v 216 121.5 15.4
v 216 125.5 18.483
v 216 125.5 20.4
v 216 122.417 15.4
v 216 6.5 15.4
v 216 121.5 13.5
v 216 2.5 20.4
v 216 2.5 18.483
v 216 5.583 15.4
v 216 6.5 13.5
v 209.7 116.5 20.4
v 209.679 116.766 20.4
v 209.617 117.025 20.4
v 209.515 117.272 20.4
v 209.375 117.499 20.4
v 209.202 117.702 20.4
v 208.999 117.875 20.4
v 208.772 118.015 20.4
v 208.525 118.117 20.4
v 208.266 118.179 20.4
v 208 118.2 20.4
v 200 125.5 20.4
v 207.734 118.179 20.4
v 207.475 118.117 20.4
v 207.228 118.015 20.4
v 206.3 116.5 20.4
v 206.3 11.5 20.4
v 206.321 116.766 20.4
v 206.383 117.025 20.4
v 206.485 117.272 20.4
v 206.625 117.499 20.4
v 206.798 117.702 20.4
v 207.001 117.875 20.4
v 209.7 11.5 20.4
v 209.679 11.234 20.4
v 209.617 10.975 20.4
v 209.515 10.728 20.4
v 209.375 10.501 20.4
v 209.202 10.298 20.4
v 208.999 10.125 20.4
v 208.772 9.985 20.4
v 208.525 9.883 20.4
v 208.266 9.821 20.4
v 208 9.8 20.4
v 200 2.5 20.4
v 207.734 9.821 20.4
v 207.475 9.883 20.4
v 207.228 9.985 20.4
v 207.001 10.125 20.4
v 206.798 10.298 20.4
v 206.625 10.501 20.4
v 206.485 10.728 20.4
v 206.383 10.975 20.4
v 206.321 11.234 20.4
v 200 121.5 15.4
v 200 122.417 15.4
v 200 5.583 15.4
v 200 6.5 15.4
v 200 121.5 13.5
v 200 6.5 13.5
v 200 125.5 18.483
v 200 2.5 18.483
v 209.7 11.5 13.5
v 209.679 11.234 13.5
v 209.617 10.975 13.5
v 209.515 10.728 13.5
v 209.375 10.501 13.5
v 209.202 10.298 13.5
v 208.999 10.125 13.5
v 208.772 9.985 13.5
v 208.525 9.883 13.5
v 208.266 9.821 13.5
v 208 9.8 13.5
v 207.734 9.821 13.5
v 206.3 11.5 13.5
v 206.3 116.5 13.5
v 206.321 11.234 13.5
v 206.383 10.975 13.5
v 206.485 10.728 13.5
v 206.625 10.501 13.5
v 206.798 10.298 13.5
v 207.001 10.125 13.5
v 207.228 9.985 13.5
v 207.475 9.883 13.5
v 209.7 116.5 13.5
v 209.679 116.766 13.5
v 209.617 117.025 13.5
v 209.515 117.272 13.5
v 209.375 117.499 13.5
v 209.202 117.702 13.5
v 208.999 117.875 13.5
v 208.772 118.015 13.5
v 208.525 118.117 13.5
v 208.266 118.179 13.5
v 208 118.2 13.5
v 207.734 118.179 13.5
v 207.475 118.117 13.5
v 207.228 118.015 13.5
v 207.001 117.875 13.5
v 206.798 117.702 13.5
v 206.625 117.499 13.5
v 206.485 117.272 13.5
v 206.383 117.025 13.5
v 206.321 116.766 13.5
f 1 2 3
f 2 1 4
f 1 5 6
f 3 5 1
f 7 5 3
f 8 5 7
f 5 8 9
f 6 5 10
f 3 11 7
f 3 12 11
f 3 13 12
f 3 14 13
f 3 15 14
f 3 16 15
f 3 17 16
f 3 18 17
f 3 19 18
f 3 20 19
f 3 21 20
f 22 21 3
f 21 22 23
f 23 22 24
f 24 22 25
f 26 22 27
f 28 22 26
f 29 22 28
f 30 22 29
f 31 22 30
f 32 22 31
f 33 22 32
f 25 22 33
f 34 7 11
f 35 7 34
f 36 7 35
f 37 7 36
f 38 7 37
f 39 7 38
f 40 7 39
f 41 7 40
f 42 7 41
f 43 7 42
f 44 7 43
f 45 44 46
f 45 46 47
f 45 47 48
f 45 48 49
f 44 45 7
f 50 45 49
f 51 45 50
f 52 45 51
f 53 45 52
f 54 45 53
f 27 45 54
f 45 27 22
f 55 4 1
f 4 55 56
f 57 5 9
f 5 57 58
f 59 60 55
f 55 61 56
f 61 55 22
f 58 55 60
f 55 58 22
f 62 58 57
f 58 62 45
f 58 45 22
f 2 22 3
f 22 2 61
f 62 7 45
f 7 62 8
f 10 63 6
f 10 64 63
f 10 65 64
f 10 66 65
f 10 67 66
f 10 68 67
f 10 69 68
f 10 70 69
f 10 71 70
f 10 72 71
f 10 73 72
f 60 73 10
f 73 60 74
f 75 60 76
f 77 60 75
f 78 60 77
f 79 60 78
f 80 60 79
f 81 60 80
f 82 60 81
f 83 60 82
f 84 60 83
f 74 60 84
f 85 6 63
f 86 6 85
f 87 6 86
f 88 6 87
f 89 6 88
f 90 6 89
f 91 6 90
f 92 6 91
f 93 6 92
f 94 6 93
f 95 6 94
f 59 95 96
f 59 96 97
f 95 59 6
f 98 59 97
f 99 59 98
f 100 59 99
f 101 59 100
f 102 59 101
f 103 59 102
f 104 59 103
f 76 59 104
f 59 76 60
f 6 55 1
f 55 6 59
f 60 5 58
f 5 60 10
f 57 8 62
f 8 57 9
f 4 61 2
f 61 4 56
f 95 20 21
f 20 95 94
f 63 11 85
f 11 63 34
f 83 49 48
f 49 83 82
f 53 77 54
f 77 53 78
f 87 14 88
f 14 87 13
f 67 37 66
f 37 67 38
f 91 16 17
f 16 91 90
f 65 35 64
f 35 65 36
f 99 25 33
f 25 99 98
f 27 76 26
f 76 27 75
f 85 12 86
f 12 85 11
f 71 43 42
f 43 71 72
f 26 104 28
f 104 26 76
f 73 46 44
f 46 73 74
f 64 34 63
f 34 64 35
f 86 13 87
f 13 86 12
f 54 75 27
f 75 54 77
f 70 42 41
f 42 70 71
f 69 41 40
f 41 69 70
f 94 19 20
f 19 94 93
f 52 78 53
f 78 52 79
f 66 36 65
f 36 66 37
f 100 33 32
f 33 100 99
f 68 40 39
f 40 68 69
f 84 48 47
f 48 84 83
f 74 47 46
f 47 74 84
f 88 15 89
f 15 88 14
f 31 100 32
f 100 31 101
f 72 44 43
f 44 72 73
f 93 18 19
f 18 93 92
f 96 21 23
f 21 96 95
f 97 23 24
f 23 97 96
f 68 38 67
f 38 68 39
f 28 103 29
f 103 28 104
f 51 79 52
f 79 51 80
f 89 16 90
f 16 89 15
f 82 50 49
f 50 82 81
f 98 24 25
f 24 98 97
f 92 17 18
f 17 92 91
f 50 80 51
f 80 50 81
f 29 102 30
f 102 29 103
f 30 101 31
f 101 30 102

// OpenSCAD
// TailWatch S3 enclosure -- strap #2 (strap_xs[1]), ASSEMBLY position.
include <../tailwatch_lib.scad>
translate([strap_xs[1], 0, 0]) strap_raw();
